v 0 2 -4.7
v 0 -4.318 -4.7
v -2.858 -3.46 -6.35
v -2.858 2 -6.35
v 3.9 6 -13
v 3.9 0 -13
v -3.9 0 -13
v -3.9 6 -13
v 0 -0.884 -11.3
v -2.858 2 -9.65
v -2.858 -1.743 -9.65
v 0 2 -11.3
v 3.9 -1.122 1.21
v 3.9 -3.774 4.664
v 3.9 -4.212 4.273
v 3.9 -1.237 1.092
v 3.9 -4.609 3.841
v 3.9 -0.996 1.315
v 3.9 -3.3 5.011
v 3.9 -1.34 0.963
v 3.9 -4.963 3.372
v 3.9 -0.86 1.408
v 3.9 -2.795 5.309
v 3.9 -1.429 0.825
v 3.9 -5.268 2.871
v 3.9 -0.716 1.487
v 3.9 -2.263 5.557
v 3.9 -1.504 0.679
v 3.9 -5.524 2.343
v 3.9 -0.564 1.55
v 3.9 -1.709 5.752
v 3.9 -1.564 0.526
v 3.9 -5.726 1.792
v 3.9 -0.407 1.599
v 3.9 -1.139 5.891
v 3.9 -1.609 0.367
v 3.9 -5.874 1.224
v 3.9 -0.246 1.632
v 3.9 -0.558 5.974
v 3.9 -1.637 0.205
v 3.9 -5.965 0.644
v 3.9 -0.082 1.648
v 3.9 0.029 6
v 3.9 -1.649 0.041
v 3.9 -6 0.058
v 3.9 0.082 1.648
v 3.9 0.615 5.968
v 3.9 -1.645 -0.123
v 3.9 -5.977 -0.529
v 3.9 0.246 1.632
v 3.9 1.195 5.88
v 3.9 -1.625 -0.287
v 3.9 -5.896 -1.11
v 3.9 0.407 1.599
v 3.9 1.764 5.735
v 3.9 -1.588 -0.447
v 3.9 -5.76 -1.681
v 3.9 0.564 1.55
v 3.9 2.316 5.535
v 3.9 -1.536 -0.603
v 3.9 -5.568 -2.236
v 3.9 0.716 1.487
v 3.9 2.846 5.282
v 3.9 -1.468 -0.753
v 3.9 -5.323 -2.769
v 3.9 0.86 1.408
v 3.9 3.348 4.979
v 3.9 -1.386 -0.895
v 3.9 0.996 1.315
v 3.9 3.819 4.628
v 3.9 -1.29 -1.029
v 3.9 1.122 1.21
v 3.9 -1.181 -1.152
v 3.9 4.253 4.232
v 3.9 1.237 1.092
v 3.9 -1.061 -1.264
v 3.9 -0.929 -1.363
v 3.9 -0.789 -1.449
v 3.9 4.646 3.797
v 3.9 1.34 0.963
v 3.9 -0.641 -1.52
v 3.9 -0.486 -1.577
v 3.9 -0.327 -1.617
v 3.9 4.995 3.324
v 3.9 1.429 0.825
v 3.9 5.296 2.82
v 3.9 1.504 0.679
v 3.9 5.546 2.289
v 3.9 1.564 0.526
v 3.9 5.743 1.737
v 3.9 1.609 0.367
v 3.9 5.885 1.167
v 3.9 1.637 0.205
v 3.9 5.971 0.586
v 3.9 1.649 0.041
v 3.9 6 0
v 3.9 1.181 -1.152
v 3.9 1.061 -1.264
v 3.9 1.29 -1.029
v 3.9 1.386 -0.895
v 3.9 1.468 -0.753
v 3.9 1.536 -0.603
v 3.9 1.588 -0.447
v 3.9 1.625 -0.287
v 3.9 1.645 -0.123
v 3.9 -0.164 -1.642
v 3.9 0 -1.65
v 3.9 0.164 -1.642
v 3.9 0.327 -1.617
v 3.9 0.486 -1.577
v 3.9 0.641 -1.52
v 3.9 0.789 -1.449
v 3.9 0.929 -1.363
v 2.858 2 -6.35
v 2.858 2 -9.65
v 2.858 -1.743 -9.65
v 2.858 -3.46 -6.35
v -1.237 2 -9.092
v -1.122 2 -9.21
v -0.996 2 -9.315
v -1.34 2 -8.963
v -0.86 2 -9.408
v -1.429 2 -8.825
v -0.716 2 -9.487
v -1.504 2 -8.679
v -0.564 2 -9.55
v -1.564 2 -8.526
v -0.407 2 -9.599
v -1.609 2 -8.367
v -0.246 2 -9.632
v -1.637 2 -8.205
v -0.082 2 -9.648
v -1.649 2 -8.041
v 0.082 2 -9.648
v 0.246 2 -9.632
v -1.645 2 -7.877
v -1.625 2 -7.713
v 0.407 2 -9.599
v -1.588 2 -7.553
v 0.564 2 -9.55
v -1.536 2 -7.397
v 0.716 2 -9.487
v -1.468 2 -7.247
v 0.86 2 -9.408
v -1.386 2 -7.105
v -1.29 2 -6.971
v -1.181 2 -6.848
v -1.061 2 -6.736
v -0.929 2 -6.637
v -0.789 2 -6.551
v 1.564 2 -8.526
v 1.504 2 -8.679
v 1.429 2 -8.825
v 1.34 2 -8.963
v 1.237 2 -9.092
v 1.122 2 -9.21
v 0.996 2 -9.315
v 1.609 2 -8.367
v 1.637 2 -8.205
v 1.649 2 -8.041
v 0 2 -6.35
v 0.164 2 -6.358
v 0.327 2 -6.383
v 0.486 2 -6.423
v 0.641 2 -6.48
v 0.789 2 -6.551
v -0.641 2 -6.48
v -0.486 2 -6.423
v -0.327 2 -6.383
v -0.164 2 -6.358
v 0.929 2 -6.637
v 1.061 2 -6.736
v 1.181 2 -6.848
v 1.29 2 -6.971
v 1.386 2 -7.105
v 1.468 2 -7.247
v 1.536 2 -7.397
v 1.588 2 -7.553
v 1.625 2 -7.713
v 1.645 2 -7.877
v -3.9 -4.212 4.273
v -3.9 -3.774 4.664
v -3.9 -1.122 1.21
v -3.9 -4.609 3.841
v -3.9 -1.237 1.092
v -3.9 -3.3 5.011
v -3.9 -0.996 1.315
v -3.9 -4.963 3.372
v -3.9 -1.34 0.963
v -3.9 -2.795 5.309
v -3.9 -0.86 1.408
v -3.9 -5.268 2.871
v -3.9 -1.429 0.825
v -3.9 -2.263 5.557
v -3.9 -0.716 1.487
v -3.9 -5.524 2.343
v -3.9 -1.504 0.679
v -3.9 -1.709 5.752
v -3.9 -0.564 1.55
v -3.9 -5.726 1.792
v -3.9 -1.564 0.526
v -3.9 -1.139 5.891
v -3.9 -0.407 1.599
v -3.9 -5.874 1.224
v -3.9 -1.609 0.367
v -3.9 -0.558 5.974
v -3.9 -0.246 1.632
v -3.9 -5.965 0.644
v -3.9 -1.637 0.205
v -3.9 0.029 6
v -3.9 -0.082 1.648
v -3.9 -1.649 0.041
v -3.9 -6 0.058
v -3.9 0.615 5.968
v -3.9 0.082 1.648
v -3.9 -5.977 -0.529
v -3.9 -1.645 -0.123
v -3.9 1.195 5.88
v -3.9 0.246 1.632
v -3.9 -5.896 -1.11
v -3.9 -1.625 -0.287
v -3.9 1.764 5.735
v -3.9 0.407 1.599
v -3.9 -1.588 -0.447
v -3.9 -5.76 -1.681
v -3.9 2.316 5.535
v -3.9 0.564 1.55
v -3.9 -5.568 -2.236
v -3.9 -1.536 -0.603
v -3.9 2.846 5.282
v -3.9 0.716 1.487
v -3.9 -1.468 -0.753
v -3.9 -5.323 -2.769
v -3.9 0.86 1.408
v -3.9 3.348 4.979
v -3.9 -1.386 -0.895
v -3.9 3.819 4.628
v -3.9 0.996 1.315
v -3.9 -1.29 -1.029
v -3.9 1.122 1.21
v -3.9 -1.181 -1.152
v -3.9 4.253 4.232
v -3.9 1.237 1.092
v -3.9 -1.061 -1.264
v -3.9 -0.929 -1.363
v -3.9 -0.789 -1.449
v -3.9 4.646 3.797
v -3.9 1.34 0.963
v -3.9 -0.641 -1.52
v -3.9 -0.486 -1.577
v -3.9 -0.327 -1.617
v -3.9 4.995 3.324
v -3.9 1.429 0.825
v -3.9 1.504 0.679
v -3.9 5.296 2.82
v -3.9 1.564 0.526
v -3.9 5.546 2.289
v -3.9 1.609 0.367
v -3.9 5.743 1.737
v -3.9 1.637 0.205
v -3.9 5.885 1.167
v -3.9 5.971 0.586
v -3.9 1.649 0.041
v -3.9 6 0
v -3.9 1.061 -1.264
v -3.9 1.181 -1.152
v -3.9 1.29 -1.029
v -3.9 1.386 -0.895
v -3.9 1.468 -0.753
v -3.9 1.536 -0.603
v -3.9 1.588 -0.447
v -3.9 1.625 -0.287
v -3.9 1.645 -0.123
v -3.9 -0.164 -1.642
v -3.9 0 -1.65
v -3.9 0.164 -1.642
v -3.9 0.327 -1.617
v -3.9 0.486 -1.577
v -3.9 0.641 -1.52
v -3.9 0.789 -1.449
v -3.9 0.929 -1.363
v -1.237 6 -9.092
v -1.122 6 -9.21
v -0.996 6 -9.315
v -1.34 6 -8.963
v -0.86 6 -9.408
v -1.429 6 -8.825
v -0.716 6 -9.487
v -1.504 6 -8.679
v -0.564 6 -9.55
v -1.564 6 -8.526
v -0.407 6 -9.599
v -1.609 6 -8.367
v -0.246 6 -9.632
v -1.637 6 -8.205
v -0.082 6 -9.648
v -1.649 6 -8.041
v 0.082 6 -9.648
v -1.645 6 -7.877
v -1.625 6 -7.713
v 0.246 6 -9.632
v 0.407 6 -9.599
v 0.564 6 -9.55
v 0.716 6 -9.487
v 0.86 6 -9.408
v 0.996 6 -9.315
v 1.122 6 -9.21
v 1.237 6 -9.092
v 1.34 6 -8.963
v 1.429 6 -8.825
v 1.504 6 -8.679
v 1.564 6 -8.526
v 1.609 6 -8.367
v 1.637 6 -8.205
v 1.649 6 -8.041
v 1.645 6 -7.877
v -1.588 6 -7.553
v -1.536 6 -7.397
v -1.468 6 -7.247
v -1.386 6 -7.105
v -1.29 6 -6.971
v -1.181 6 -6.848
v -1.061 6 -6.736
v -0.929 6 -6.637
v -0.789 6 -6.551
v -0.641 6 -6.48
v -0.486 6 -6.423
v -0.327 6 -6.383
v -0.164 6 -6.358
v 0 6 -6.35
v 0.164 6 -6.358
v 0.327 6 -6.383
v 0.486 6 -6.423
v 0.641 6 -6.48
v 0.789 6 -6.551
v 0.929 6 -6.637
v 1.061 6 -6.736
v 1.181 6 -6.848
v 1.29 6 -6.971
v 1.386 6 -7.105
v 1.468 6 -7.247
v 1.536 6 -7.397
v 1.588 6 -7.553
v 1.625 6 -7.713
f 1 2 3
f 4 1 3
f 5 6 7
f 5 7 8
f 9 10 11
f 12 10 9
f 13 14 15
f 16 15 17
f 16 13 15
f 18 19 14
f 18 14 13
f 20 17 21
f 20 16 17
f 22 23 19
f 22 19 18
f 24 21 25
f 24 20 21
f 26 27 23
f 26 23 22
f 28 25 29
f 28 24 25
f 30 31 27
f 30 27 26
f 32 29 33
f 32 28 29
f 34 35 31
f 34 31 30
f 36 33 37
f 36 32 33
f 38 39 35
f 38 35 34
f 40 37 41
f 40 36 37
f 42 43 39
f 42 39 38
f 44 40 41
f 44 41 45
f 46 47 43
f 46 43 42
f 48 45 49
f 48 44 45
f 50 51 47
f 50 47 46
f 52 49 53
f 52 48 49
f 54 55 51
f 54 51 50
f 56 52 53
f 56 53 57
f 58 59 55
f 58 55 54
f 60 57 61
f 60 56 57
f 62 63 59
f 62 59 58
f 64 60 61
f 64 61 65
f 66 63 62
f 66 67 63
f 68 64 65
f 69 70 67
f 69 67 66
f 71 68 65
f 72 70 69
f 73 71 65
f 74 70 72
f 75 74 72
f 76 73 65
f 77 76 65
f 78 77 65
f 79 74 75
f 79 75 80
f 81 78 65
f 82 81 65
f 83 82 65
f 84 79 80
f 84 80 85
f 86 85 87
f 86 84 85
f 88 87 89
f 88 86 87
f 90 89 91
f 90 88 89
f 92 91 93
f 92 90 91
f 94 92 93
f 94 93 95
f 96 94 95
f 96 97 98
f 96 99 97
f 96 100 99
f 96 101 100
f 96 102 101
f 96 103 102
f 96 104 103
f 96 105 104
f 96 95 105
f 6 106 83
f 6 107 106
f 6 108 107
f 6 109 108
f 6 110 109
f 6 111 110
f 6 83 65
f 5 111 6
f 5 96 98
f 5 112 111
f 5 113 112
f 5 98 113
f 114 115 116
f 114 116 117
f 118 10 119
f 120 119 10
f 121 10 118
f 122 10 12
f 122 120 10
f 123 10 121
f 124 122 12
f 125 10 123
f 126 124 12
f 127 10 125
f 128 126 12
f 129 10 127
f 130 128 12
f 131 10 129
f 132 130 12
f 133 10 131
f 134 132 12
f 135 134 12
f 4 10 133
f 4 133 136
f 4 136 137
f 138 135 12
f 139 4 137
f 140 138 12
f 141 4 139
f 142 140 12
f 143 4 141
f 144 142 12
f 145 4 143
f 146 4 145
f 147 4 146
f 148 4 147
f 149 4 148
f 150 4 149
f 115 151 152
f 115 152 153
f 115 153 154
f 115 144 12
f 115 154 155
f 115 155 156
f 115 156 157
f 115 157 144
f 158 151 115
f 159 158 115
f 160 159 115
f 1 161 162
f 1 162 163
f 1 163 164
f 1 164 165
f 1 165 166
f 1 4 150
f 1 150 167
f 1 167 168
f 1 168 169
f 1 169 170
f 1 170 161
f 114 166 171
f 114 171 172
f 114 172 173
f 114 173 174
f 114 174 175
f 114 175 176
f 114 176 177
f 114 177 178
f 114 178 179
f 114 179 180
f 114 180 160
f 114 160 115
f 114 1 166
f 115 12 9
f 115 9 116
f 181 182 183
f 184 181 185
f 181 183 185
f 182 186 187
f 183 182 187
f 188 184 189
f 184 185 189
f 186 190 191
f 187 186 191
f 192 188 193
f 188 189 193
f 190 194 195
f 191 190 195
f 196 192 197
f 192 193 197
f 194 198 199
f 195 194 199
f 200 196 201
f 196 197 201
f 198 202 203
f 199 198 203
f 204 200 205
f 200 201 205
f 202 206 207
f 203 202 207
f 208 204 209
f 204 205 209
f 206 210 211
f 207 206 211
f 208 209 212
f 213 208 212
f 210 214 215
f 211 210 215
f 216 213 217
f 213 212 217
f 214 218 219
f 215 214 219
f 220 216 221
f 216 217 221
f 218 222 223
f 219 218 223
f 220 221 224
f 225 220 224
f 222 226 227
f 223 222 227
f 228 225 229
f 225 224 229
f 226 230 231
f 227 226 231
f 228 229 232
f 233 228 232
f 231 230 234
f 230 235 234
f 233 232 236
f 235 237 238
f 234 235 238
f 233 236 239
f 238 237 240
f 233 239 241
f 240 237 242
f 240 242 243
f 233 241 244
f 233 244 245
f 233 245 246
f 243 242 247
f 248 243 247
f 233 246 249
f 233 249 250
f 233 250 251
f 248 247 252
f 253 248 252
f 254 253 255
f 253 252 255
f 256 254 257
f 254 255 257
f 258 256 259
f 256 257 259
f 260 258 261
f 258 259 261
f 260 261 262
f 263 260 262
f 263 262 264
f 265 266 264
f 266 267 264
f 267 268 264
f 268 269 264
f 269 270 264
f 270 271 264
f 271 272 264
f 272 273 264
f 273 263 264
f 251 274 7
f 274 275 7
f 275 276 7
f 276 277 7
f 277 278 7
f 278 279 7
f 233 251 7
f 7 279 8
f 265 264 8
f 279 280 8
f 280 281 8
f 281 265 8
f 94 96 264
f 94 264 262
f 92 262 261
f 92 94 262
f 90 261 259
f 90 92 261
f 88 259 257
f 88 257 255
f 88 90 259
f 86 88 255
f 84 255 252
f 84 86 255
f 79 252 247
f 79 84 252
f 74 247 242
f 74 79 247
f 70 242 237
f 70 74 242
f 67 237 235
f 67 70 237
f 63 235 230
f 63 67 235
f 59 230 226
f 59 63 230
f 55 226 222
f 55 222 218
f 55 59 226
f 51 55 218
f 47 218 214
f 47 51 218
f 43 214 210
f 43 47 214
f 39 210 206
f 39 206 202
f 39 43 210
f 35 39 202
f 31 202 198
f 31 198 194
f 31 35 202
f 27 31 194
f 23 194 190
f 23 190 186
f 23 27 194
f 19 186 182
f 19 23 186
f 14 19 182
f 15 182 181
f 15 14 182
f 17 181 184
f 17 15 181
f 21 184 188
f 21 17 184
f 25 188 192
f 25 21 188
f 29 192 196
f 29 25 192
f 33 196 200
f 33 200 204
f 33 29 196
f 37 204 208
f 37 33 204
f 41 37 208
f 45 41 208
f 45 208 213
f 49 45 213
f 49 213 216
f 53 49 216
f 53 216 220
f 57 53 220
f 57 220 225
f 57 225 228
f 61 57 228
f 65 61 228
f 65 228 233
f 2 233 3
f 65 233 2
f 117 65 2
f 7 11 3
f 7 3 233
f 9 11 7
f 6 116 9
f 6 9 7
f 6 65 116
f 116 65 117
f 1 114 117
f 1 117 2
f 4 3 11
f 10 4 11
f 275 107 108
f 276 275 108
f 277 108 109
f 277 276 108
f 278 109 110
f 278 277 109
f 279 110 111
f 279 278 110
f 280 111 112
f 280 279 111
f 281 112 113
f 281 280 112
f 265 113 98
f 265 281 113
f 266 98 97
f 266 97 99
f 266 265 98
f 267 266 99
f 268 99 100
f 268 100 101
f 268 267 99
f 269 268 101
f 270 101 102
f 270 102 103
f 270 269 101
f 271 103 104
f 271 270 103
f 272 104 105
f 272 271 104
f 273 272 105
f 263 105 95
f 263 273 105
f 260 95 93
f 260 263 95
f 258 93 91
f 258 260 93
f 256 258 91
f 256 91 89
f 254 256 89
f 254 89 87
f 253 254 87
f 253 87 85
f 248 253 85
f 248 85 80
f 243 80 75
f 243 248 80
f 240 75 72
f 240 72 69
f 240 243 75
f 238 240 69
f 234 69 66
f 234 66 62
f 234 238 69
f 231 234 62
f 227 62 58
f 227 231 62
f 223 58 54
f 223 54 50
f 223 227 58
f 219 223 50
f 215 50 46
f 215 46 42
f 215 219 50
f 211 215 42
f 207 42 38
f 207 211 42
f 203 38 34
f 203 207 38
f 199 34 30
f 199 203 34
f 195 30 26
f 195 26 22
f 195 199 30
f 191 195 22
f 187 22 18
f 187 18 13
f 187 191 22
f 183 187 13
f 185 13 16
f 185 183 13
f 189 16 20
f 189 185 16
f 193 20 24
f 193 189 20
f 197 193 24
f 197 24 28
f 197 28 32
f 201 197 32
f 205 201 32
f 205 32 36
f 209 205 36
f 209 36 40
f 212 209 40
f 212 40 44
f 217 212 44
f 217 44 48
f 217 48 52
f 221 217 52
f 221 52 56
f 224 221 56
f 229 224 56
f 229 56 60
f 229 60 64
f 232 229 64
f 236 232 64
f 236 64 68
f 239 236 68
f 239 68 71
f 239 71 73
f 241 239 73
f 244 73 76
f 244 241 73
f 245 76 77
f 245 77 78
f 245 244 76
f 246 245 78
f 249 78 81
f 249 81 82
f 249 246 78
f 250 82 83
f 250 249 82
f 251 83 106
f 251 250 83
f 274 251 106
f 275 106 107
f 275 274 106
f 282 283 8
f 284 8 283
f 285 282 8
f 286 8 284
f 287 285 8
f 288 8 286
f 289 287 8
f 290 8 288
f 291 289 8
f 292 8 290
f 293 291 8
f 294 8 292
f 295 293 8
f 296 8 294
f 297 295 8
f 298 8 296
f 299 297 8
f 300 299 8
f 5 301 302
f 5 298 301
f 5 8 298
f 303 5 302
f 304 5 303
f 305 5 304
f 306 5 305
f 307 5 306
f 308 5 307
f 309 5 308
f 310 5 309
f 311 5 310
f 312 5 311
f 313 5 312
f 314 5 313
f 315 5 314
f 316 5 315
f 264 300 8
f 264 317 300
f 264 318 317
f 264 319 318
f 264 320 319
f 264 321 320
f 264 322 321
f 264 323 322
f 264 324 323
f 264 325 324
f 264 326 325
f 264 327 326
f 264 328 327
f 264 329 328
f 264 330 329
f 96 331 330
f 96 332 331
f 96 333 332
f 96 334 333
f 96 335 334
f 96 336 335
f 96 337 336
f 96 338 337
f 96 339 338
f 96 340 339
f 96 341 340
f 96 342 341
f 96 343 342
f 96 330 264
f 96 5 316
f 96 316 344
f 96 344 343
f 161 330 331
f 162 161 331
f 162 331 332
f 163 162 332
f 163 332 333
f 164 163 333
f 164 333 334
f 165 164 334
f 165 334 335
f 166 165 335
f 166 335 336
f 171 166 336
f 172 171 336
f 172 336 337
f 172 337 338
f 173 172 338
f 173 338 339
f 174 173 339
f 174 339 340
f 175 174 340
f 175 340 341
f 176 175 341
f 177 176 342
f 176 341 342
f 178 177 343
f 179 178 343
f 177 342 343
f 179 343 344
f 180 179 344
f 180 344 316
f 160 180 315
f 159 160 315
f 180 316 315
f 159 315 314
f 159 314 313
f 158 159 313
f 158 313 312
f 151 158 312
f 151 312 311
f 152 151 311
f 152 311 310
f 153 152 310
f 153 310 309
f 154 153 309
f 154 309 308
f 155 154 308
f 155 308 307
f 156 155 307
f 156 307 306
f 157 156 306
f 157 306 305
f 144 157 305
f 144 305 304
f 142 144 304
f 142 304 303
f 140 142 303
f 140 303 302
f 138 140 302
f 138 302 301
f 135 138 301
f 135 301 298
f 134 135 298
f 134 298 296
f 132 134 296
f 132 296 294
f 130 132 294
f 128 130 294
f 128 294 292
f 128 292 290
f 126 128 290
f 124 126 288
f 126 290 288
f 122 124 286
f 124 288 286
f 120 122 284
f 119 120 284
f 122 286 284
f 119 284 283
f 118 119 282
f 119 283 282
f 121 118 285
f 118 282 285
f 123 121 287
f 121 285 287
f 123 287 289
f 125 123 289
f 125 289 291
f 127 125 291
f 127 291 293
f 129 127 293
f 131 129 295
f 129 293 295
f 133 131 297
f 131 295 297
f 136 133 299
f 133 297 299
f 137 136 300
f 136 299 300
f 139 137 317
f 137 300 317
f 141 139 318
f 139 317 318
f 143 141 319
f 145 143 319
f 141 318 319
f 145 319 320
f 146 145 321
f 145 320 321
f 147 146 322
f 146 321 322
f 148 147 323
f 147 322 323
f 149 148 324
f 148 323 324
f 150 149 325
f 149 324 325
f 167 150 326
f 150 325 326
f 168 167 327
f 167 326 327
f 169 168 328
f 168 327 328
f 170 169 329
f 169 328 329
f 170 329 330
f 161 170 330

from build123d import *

# Parameters (mm, degrees)
SKETCH1_R           = 1.65
BOSS_EXTRUDE1_DEPTH = 3.9
BOSS_EXTRUDE2_DEPTH = 3.9
SKETCH2_R           = 1.65
CUT_EXTRUDE5_DEPTH  = 19.116567004
CUT_EXTRUDE6_START  = 4
CUT_EXTRUDE6_DEPTH  = 15.116567004


with BuildPart() as part:
    # Sketch1 → Boss-Extrude1 (new, symmetric)
    with BuildSketch(Plane(origin=(0, 0, 0), x_dir=(0, 0, -1), z_dir=(1, 0, 0))):
        with BuildLine():
            ThreePointArc((6, 0), (4.242640687, 4.242640687), (0, 6))
            ThreePointArc((0, 6), (-5.828221306, -1.425424992), (2.769230769, -5.322721198))
            ThreePointArc((2.769230769, -5.322721198), (5.129102486, -3.11324713), (6, 0))
        make_face()
        Circle(SKETCH1_R, mode=Mode.SUBTRACT)
    extrude(amount=BOSS_EXTRUDE1_DEPTH, both=True)

    # Sketch1<4> → Boss-Extrude2 (add, symmetric)
    with BuildSketch(Plane(origin=(0, 0, 0), x_dir=(0, 0, -1), z_dir=(1, 0, 0))):
        with BuildLine():
            Line((13, 6), (0, 6))
            ThreePointArc((0, 6), (4.242640687, 4.242640687), (6, 0))
            ThreePointArc((6, 0), (5.129102486, -3.11324713), (2.769230769, -5.322721198))
            Line((2.769230769, -5.322721198), (13, 0))
            Line((13, 0), (13, 6))
        make_face()
    extrude(amount=BOSS_EXTRUDE2_DEPTH, both=True)

    # Sketch2 → Cut-Extrude5 (cut, through all)
    with BuildSketch(Plane(origin=(0, 6, 0), x_dir=(1, 0, 0), z_dir=(0, 1, 0))):
        with Locations((0, 8)):
            Circle(SKETCH2_R)
    extrude(amount=-CUT_EXTRUDE5_DEPTH, mode=Mode.SUBTRACT)

    # Sketch3 → Cut-Extrude6 (cut, through all)
    with BuildSketch(Plane.XZ.offset(-6).offset(CUT_EXTRUDE6_START)):
        Polygon((0, -11.3), (2.857883832, -9.65), (2.857883832, -6.35), (0, -4.7), (-2.857883832, -6.35), (-2.857883832, -9.65), align=None)
    extrude(amount=CUT_EXTRUDE6_DEPTH, mode=Mode.SUBTRACT)


solid = part.part
